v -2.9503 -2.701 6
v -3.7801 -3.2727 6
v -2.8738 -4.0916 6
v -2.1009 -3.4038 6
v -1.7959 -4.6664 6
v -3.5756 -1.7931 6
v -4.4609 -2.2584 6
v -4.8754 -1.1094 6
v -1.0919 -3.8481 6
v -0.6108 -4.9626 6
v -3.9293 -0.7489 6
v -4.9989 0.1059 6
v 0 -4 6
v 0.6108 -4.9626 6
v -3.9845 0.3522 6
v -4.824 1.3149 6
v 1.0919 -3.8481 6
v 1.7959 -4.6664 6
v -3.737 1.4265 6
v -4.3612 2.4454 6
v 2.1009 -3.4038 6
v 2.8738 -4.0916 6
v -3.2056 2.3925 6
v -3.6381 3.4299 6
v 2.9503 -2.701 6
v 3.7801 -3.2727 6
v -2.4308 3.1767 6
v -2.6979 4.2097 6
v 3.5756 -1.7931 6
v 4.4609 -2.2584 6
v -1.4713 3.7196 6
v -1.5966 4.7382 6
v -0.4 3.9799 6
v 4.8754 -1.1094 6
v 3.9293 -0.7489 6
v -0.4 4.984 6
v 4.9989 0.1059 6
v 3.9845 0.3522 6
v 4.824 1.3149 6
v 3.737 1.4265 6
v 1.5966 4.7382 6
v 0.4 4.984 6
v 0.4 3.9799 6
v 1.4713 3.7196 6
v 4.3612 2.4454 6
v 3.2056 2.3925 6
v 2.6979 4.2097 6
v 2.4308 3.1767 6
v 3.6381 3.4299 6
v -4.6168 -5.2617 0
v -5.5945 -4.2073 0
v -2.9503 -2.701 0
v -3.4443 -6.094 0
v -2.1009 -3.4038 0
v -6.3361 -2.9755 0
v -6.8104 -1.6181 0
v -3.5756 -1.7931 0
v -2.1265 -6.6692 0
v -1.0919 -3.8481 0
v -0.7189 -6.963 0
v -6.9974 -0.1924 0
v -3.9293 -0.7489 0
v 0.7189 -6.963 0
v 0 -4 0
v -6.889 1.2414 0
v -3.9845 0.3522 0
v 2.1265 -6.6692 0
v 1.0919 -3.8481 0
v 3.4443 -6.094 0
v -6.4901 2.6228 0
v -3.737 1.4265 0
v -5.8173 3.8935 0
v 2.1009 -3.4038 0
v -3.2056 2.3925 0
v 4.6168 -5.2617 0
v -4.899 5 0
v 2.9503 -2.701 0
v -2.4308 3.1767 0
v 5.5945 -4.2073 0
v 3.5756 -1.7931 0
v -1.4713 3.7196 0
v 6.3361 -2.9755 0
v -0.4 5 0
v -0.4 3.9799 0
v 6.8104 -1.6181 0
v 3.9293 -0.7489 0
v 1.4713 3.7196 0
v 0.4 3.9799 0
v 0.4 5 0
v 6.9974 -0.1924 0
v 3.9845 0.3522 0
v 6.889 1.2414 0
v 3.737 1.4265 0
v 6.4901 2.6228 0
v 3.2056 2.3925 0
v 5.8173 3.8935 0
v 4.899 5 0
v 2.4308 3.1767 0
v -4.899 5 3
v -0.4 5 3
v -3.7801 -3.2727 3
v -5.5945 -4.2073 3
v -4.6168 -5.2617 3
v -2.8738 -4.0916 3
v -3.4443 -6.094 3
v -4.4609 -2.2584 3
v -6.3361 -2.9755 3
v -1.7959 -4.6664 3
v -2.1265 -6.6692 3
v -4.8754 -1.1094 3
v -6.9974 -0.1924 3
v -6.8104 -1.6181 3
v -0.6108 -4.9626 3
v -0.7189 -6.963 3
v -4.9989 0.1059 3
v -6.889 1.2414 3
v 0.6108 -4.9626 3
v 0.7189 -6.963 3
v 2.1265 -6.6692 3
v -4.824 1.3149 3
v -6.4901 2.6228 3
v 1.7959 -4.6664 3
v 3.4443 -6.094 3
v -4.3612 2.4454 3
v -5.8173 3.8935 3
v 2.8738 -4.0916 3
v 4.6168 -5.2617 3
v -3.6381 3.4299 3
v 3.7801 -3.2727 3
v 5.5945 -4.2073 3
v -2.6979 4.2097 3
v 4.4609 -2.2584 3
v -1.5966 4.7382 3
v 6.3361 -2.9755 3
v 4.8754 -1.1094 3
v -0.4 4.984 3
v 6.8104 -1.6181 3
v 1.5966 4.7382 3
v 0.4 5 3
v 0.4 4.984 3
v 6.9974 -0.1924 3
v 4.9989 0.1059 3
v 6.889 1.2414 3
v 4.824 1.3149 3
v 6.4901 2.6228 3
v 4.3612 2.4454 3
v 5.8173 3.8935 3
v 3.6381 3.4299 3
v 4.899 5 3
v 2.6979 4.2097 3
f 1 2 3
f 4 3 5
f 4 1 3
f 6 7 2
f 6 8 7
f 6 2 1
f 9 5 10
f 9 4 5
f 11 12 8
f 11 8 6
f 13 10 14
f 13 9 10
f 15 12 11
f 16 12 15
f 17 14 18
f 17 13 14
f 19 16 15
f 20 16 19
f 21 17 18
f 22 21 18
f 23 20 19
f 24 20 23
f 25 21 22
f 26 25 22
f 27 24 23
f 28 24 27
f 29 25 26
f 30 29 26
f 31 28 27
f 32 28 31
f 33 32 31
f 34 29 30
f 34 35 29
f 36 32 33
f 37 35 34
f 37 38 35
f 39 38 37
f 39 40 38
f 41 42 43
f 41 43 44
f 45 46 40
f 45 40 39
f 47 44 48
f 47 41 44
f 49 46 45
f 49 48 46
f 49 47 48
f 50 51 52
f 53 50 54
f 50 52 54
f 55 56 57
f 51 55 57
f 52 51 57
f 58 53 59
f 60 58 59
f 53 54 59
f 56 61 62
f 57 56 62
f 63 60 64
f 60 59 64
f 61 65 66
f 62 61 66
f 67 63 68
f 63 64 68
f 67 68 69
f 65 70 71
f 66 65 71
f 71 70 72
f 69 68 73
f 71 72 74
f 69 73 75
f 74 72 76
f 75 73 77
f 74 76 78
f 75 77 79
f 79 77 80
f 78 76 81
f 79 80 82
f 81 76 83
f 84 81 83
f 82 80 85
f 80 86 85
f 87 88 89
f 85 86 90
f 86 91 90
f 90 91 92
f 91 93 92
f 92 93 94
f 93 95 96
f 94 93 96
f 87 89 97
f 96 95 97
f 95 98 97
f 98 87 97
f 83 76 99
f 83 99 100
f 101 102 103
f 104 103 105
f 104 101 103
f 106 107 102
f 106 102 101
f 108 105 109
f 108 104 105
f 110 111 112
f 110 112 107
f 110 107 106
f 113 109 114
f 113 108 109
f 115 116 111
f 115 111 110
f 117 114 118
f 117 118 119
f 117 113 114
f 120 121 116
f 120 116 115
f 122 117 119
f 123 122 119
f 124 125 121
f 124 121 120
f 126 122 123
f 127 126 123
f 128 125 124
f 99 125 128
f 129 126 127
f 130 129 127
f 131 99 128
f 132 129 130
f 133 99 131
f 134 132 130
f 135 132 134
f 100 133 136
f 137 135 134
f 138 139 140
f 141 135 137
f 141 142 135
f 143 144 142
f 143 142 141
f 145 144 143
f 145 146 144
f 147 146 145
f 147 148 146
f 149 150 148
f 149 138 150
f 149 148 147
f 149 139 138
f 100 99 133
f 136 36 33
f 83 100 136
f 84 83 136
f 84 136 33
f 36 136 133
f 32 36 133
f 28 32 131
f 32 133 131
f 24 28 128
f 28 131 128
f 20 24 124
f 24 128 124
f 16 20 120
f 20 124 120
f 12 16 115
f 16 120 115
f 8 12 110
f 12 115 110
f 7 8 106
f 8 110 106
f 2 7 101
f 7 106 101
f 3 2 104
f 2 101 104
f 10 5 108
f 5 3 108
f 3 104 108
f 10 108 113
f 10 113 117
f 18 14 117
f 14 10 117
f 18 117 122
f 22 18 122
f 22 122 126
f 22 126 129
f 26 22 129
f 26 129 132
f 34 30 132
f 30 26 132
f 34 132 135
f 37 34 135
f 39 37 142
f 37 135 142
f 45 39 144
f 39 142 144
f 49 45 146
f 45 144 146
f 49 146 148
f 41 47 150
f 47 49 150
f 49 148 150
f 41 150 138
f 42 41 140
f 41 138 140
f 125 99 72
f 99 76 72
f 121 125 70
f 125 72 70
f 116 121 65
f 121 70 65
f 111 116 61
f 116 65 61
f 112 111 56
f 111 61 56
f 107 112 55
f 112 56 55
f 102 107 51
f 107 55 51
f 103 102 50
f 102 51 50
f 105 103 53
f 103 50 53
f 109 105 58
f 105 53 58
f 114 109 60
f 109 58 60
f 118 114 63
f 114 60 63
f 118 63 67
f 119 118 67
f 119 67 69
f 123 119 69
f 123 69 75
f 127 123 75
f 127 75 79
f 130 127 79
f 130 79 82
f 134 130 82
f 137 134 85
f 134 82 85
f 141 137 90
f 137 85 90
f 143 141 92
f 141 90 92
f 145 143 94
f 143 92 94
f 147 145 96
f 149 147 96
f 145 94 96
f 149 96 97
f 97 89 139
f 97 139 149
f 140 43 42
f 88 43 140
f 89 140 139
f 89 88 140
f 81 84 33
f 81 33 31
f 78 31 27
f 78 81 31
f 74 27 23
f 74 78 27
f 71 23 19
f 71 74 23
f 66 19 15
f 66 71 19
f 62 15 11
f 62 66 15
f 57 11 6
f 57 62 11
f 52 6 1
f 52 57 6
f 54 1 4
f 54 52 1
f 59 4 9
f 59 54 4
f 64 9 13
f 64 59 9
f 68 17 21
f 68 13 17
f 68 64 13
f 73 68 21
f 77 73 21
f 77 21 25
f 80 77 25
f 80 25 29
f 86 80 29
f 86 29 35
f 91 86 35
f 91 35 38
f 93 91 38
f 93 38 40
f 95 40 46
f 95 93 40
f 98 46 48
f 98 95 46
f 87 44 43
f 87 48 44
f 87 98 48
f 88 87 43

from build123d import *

# Parameters (mm, degrees)
F0_R     = 7
F0_R_2   = 4
F1_DEPTH = 3
F2_R     = 5
F2_R_2   = 4
F3_DEPTH = 3
F5_DEPTH = 6


with BuildPart() as f1:
    # F0 (on Top) → F1 (new body)
    with BuildSketch(Plane.XY):
        Circle(F0_R)
        Circle(F0_R_2, mode=Mode.SUBTRACT)
    extrude(amount=F1_DEPTH)

    # F2 (on face) → F3 (join)
    with BuildSketch(Plane.XY.offset(3)):
        Circle(F2_R)
        Circle(F2_R_2, mode=Mode.SUBTRACT)
    extrude(amount=F3_DEPTH)

    # F4 (on Top) → F5 (cut, through all)
    with BuildSketch(Plane.XY):
        with BuildLine():
            Line((0.4, 5), (4.8989794856, 5))
            ThreePointArc((4.8989794856, 5), (0, 7), (-4.8989794856, 5))
            Line((-4.8989794856, 5), (-0.4, 5))
            Line((-0.4, 5), (0, 5))
            Line((0, 5), (0.4, 5))
        make_face()
        Polygon((0.4, 3.376792185), (0.4, 5), (0, 5), (-0.4, 5), (-0.4, 3.376792185), align=None)
    extrude(amount=F5_DEPTH, mode=Mode.SUBTRACT)


solid = f1.part
